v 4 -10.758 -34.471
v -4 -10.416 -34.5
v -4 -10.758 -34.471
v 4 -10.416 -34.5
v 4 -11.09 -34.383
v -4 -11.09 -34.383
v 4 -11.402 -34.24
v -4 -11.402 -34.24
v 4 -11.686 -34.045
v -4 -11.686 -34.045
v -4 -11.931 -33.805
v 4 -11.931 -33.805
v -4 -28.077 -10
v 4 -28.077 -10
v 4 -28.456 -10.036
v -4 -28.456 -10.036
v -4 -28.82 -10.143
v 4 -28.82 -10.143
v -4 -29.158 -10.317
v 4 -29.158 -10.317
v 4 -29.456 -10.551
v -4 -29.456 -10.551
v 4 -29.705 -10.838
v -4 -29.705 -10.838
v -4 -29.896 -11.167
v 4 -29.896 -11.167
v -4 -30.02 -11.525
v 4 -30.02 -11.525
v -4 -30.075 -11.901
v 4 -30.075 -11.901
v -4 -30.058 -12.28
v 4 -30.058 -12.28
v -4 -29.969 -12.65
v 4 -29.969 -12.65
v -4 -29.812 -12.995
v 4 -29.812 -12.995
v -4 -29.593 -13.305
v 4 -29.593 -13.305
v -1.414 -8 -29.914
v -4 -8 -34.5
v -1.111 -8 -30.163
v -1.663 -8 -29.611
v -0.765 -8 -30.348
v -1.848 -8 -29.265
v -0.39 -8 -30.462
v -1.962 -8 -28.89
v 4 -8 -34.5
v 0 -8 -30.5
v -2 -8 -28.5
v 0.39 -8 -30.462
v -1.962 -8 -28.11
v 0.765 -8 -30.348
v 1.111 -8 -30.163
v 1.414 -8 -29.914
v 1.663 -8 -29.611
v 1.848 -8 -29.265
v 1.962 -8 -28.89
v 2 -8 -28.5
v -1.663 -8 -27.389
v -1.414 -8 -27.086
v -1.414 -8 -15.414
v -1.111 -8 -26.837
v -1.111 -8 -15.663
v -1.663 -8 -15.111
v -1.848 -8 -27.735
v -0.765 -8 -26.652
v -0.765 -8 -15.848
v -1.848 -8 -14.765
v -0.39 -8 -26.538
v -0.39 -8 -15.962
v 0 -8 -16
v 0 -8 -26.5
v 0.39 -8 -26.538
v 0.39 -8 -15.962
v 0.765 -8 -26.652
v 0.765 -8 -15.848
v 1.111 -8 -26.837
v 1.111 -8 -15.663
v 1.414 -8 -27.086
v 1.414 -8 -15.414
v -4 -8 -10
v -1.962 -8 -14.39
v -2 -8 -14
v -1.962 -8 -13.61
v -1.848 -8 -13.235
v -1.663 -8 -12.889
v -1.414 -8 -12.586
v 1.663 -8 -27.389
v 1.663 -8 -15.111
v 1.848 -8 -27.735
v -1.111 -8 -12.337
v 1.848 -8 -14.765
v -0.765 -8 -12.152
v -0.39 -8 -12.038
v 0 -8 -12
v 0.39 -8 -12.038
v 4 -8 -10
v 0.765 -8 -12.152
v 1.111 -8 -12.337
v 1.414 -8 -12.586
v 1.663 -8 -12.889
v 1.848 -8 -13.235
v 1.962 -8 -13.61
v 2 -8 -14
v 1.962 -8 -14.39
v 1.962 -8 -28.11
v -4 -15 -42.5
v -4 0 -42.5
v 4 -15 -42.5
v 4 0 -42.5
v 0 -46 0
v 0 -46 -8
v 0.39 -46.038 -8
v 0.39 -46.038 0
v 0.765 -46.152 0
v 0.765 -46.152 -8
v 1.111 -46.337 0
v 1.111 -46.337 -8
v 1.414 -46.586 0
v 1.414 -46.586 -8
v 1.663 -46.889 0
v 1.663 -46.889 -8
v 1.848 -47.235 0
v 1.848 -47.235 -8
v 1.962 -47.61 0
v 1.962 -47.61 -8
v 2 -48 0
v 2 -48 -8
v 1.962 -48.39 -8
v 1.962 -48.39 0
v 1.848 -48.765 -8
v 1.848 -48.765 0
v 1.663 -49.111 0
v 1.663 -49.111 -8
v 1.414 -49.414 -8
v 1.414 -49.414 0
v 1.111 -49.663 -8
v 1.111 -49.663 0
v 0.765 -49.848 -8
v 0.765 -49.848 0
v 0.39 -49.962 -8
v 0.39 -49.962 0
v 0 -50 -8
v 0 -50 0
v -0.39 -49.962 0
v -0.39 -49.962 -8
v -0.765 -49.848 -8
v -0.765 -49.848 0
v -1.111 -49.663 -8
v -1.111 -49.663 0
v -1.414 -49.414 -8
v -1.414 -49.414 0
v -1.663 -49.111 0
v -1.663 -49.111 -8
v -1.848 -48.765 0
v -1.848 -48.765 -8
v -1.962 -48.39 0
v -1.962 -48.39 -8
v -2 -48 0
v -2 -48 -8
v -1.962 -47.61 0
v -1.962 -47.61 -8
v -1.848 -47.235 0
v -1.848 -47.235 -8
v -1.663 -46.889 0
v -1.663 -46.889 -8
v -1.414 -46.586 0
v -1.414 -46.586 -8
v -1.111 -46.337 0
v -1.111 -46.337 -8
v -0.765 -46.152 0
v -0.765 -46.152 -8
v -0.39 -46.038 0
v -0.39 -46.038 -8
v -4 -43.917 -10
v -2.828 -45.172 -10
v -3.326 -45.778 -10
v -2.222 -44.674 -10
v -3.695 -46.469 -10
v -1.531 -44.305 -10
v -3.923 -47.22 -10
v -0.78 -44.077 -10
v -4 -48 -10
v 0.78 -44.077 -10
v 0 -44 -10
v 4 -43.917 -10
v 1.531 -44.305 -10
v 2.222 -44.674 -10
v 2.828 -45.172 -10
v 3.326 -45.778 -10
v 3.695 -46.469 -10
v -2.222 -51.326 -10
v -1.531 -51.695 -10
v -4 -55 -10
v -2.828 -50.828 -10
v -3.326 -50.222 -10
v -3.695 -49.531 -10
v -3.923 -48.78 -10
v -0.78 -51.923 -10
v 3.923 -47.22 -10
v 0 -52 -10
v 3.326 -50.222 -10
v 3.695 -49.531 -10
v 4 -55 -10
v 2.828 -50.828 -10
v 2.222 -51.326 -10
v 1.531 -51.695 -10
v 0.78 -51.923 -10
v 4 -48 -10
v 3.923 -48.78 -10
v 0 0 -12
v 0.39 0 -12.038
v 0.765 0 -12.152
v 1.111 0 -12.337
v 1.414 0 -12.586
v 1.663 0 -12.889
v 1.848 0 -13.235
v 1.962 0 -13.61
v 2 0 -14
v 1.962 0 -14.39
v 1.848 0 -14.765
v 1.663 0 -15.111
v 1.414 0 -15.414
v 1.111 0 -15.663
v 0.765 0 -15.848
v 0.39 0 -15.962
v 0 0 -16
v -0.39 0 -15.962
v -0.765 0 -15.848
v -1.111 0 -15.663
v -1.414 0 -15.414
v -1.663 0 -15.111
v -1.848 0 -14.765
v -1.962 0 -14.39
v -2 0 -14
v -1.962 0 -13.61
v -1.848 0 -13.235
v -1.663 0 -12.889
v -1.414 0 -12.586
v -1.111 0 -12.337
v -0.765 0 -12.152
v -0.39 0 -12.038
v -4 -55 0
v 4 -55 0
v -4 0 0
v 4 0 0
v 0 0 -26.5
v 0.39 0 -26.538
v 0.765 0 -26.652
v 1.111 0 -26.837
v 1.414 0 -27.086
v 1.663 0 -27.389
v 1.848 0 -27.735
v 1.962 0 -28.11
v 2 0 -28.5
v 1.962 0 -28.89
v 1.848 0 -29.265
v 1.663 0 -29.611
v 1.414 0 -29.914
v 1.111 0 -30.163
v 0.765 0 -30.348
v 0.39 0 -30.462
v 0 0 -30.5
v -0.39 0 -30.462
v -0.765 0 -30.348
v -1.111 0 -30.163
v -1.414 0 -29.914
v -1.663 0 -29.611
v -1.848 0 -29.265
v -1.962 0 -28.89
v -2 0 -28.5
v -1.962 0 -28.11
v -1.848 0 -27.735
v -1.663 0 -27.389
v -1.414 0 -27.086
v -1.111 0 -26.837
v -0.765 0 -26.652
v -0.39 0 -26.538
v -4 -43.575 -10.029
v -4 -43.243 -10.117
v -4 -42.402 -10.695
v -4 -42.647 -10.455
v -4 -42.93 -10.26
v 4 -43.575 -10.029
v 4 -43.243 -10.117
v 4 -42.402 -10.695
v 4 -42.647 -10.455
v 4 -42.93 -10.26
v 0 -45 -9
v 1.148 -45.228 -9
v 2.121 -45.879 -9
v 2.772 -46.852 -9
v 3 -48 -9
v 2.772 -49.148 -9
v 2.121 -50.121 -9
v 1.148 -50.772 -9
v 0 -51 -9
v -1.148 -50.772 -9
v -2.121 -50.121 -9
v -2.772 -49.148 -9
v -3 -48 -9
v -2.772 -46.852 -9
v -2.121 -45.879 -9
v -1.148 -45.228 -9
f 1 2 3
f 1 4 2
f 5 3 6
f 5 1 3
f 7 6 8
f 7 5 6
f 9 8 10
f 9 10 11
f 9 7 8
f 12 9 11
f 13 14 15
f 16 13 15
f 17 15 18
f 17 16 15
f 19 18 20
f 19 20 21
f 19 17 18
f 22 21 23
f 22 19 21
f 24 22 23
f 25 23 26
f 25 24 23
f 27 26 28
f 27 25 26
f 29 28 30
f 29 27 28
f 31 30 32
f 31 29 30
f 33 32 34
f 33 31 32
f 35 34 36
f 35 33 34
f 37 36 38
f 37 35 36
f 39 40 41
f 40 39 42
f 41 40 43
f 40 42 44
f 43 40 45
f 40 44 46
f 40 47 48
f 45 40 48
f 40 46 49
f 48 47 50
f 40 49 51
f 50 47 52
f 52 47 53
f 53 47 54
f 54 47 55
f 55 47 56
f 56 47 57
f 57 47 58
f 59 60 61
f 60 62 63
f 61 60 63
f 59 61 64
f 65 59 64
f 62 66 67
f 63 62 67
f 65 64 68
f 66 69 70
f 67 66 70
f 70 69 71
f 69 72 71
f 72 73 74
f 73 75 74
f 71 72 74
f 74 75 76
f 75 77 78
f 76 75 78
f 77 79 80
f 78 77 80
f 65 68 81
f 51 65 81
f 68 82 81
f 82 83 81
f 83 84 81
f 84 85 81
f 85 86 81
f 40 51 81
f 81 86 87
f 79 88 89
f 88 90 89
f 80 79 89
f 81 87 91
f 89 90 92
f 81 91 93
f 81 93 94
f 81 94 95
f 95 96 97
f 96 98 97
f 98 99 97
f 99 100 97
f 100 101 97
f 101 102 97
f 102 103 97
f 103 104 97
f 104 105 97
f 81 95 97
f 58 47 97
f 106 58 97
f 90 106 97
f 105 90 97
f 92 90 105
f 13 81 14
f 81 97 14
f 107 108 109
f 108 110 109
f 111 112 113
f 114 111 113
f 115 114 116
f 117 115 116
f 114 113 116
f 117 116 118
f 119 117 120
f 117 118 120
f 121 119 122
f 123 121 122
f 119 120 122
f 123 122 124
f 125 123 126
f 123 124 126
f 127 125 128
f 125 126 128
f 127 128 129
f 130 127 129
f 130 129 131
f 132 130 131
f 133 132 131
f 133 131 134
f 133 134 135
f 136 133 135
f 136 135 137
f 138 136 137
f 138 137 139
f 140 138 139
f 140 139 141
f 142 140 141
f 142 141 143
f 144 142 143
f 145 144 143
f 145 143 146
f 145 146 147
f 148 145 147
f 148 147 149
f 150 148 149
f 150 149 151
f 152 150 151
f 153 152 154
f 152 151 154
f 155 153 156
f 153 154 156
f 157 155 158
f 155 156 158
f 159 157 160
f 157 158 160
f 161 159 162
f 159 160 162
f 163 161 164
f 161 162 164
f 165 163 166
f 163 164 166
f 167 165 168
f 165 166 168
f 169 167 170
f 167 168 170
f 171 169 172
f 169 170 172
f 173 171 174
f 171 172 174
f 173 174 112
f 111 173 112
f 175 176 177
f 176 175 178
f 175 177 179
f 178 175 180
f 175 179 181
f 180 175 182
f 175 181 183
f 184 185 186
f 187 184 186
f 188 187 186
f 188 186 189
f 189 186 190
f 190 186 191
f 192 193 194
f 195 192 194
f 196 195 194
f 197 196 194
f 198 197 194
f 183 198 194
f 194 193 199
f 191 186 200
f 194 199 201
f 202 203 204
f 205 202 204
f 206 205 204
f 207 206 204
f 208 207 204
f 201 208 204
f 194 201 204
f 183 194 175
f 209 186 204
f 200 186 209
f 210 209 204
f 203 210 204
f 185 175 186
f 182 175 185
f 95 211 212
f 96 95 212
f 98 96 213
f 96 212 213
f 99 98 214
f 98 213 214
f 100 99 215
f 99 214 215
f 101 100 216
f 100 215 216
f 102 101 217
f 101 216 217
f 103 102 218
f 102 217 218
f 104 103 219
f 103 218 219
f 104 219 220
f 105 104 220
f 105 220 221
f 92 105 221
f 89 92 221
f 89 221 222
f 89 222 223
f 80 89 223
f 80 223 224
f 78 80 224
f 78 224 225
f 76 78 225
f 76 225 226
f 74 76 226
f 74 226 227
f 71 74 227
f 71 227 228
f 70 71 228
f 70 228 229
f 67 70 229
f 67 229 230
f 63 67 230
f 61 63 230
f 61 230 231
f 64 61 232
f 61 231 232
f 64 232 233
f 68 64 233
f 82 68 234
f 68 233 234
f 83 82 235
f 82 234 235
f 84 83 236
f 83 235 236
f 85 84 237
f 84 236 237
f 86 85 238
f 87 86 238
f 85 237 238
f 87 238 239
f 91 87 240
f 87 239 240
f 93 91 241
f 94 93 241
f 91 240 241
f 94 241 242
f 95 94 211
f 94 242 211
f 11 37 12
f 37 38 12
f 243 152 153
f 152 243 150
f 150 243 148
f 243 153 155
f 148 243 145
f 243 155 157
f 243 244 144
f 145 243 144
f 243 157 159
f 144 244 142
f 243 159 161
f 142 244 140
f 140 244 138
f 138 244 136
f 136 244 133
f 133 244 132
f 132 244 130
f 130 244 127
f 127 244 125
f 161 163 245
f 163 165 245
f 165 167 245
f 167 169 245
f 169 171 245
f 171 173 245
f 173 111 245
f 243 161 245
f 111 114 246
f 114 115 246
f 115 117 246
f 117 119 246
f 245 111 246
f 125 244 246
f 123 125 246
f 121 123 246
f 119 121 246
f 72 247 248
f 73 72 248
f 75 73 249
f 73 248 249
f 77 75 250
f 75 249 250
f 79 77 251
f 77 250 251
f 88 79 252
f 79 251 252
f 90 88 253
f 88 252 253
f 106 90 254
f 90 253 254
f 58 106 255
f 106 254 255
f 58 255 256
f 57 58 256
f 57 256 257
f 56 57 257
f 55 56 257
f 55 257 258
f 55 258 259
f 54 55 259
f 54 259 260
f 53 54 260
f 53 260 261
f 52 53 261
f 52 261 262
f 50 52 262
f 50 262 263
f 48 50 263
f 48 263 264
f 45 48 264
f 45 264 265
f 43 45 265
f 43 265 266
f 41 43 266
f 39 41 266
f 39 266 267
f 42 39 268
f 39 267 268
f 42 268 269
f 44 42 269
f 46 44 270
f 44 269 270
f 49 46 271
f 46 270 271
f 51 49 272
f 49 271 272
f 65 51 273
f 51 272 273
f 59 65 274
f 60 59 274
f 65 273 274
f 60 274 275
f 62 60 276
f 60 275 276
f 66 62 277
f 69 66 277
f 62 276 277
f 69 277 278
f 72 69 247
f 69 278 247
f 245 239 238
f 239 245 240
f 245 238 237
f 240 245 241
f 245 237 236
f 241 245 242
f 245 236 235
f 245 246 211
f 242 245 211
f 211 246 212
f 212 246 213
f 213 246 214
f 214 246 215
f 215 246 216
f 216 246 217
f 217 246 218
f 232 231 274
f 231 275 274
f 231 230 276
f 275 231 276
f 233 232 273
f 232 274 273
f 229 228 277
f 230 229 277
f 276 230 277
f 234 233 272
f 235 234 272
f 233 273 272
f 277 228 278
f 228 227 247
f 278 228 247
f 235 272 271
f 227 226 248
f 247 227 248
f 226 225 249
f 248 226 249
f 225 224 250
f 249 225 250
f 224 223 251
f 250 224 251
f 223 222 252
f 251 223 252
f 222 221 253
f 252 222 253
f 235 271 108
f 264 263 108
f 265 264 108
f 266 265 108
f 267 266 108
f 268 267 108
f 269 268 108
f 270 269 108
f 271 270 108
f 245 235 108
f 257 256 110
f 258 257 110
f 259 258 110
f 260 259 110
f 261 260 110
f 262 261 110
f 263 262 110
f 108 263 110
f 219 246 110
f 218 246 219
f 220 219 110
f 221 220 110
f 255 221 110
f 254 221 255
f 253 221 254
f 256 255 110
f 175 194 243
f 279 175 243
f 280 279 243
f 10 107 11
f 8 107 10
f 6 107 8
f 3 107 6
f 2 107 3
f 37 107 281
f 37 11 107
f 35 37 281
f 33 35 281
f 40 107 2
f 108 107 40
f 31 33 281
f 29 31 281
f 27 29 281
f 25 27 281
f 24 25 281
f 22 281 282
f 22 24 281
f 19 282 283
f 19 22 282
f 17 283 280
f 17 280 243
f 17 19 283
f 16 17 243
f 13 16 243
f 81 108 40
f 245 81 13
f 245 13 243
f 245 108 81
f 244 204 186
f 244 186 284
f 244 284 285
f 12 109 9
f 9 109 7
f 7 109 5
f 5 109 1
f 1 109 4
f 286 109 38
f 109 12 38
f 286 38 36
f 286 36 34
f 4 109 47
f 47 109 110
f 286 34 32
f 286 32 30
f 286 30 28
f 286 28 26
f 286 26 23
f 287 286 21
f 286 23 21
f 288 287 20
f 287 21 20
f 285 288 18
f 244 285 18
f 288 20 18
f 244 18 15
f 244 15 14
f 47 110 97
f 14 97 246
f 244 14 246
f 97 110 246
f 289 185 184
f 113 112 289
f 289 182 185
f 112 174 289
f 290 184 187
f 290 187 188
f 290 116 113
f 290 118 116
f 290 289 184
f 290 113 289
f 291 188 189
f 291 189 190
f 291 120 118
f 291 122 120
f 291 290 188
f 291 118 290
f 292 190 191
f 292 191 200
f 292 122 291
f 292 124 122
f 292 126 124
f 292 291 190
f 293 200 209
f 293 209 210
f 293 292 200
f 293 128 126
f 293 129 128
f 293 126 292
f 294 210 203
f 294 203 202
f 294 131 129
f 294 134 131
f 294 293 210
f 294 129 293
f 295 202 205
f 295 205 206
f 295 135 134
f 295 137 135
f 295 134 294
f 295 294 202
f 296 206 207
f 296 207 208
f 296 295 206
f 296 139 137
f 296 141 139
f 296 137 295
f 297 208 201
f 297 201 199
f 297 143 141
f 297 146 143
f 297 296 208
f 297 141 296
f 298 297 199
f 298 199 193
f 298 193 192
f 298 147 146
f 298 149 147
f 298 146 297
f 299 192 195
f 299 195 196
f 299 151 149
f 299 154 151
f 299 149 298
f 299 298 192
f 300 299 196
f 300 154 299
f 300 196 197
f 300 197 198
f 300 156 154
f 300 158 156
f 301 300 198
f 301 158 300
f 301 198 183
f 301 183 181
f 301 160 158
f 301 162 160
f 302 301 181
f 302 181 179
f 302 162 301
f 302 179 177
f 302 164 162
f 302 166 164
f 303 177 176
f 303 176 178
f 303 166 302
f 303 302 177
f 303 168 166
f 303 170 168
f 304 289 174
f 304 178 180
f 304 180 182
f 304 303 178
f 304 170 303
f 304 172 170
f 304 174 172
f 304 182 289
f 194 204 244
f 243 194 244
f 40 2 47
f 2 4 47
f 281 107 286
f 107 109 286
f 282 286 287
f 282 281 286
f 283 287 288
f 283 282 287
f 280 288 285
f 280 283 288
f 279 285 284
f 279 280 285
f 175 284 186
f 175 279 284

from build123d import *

# Parameters (mm, degrees)
EXTRUDE_1_DEPTH     = 4
CUT_EXTRUDE_1_REACH = 71.622
SKETCH_2_R          = 2
CUT_EXTRUDE_3_REACH = 66.01
SKETCH_4_R          = 2
FILLET_1_R          = 2
CHAMFER_1_SIZE      = 2


with BuildPart() as part:
    # 草图1 → 凸台-拉伸1 (new, symmetric)
    with BuildSketch(Plane(origin=(0, 0, 0), x_dir=(0, 0, -1), z_dir=(1, 0, 0))):
        Polygon((0, 0), (42.5, 0), (42.5, -15), (10, -43), (10, -55), (0, -55), align=None)
        Polygon((10, -32.440459038), (34.5, -11.33276673), (34.5, -8), (10, -8), align=None, mode=Mode.SUBTRACT)
    extrude(amount=EXTRUDE_1_DEPTH, both=True)

    # 草图2 → 切除-拉伸1 (cut, up to next)
    with BuildSketch(Plane(origin=(0, 0, 0), x_dir=(1, 0, 0), z_dir=(0, 1, 0)), mode=Mode.PRIVATE) as cut_extrude_1_sk1:
        with Locations(Location((0, 14, 0), (0, 0, 270))):
            Circle(SKETCH_2_R)
    cut_extrude_1_tool1 = extrude(cut_extrude_1_sk1.sketch, amount=-CUT_EXTRUDE_1_REACH, mode=Mode.PRIVATE) & part.part
    # 草图2 → 切除-拉伸1 (cut, up to next)
    with BuildSketch(Plane(origin=(0, 0, 0), x_dir=(1, 0, 0), z_dir=(0, 1, 0)), mode=Mode.PRIVATE) as cut_extrude_1_sk2:
        with Locations(Location((0, 28.5, 0), (0, 0, 270))):
            Circle(SKETCH_2_R)
    cut_extrude_1_tool2 = extrude(cut_extrude_1_sk2.sketch, amount=-CUT_EXTRUDE_1_REACH, mode=Mode.PRIVATE) & part.part
    add(cut_extrude_1_tool1.solids().sort_by_distance((0, 0, -14))[0], mode=Mode.SUBTRACT)
    add(cut_extrude_1_tool2.solids().sort_by_distance((0, 0, -28.5))[0], mode=Mode.SUBTRACT)

    # 草图4 → 切除-拉伸3 (cut, up to next)
    with BuildSketch(Plane(origin=(0, 0, -10), x_dir=(-1, 0, 0), z_dir=(0, 0, -1)), mode=Mode.PRIVATE) as cut_extrude_3_sk1:
        with Locations(Location((0, -48, 0), (0, 0, 90))):
            Circle(SKETCH_4_R)
    cut_extrude_3_tool1 = extrude(cut_extrude_3_sk1.sketch, amount=-CUT_EXTRUDE_3_REACH, mode=Mode.PRIVATE) & part.part
    add(cut_extrude_3_tool1.solids().sort_by_distance((0, -48, -10))[0], mode=Mode.SUBTRACT)

    # 圆角1
    fillet_1_edges = [part.edges().sort_by_distance(p)[0] for p in [
        (0, -43, -10),
        (0, -32.440459038, -10),
        (0, -11.33276673, -34.5),
    ]]
    fillet(fillet_1_edges, radius=FILLET_1_R)

    # 倒角1
    chamfer_1_edges = [part.edges().sort_by_distance(p)[0] for p in [
        (0, -50, -10),
    ]]
    chamfer(chamfer_1_edges, length=CHAMFER_1_SIZE - 0.0001)  # a hair under: the kernel refuses the full size


solid = part.part
